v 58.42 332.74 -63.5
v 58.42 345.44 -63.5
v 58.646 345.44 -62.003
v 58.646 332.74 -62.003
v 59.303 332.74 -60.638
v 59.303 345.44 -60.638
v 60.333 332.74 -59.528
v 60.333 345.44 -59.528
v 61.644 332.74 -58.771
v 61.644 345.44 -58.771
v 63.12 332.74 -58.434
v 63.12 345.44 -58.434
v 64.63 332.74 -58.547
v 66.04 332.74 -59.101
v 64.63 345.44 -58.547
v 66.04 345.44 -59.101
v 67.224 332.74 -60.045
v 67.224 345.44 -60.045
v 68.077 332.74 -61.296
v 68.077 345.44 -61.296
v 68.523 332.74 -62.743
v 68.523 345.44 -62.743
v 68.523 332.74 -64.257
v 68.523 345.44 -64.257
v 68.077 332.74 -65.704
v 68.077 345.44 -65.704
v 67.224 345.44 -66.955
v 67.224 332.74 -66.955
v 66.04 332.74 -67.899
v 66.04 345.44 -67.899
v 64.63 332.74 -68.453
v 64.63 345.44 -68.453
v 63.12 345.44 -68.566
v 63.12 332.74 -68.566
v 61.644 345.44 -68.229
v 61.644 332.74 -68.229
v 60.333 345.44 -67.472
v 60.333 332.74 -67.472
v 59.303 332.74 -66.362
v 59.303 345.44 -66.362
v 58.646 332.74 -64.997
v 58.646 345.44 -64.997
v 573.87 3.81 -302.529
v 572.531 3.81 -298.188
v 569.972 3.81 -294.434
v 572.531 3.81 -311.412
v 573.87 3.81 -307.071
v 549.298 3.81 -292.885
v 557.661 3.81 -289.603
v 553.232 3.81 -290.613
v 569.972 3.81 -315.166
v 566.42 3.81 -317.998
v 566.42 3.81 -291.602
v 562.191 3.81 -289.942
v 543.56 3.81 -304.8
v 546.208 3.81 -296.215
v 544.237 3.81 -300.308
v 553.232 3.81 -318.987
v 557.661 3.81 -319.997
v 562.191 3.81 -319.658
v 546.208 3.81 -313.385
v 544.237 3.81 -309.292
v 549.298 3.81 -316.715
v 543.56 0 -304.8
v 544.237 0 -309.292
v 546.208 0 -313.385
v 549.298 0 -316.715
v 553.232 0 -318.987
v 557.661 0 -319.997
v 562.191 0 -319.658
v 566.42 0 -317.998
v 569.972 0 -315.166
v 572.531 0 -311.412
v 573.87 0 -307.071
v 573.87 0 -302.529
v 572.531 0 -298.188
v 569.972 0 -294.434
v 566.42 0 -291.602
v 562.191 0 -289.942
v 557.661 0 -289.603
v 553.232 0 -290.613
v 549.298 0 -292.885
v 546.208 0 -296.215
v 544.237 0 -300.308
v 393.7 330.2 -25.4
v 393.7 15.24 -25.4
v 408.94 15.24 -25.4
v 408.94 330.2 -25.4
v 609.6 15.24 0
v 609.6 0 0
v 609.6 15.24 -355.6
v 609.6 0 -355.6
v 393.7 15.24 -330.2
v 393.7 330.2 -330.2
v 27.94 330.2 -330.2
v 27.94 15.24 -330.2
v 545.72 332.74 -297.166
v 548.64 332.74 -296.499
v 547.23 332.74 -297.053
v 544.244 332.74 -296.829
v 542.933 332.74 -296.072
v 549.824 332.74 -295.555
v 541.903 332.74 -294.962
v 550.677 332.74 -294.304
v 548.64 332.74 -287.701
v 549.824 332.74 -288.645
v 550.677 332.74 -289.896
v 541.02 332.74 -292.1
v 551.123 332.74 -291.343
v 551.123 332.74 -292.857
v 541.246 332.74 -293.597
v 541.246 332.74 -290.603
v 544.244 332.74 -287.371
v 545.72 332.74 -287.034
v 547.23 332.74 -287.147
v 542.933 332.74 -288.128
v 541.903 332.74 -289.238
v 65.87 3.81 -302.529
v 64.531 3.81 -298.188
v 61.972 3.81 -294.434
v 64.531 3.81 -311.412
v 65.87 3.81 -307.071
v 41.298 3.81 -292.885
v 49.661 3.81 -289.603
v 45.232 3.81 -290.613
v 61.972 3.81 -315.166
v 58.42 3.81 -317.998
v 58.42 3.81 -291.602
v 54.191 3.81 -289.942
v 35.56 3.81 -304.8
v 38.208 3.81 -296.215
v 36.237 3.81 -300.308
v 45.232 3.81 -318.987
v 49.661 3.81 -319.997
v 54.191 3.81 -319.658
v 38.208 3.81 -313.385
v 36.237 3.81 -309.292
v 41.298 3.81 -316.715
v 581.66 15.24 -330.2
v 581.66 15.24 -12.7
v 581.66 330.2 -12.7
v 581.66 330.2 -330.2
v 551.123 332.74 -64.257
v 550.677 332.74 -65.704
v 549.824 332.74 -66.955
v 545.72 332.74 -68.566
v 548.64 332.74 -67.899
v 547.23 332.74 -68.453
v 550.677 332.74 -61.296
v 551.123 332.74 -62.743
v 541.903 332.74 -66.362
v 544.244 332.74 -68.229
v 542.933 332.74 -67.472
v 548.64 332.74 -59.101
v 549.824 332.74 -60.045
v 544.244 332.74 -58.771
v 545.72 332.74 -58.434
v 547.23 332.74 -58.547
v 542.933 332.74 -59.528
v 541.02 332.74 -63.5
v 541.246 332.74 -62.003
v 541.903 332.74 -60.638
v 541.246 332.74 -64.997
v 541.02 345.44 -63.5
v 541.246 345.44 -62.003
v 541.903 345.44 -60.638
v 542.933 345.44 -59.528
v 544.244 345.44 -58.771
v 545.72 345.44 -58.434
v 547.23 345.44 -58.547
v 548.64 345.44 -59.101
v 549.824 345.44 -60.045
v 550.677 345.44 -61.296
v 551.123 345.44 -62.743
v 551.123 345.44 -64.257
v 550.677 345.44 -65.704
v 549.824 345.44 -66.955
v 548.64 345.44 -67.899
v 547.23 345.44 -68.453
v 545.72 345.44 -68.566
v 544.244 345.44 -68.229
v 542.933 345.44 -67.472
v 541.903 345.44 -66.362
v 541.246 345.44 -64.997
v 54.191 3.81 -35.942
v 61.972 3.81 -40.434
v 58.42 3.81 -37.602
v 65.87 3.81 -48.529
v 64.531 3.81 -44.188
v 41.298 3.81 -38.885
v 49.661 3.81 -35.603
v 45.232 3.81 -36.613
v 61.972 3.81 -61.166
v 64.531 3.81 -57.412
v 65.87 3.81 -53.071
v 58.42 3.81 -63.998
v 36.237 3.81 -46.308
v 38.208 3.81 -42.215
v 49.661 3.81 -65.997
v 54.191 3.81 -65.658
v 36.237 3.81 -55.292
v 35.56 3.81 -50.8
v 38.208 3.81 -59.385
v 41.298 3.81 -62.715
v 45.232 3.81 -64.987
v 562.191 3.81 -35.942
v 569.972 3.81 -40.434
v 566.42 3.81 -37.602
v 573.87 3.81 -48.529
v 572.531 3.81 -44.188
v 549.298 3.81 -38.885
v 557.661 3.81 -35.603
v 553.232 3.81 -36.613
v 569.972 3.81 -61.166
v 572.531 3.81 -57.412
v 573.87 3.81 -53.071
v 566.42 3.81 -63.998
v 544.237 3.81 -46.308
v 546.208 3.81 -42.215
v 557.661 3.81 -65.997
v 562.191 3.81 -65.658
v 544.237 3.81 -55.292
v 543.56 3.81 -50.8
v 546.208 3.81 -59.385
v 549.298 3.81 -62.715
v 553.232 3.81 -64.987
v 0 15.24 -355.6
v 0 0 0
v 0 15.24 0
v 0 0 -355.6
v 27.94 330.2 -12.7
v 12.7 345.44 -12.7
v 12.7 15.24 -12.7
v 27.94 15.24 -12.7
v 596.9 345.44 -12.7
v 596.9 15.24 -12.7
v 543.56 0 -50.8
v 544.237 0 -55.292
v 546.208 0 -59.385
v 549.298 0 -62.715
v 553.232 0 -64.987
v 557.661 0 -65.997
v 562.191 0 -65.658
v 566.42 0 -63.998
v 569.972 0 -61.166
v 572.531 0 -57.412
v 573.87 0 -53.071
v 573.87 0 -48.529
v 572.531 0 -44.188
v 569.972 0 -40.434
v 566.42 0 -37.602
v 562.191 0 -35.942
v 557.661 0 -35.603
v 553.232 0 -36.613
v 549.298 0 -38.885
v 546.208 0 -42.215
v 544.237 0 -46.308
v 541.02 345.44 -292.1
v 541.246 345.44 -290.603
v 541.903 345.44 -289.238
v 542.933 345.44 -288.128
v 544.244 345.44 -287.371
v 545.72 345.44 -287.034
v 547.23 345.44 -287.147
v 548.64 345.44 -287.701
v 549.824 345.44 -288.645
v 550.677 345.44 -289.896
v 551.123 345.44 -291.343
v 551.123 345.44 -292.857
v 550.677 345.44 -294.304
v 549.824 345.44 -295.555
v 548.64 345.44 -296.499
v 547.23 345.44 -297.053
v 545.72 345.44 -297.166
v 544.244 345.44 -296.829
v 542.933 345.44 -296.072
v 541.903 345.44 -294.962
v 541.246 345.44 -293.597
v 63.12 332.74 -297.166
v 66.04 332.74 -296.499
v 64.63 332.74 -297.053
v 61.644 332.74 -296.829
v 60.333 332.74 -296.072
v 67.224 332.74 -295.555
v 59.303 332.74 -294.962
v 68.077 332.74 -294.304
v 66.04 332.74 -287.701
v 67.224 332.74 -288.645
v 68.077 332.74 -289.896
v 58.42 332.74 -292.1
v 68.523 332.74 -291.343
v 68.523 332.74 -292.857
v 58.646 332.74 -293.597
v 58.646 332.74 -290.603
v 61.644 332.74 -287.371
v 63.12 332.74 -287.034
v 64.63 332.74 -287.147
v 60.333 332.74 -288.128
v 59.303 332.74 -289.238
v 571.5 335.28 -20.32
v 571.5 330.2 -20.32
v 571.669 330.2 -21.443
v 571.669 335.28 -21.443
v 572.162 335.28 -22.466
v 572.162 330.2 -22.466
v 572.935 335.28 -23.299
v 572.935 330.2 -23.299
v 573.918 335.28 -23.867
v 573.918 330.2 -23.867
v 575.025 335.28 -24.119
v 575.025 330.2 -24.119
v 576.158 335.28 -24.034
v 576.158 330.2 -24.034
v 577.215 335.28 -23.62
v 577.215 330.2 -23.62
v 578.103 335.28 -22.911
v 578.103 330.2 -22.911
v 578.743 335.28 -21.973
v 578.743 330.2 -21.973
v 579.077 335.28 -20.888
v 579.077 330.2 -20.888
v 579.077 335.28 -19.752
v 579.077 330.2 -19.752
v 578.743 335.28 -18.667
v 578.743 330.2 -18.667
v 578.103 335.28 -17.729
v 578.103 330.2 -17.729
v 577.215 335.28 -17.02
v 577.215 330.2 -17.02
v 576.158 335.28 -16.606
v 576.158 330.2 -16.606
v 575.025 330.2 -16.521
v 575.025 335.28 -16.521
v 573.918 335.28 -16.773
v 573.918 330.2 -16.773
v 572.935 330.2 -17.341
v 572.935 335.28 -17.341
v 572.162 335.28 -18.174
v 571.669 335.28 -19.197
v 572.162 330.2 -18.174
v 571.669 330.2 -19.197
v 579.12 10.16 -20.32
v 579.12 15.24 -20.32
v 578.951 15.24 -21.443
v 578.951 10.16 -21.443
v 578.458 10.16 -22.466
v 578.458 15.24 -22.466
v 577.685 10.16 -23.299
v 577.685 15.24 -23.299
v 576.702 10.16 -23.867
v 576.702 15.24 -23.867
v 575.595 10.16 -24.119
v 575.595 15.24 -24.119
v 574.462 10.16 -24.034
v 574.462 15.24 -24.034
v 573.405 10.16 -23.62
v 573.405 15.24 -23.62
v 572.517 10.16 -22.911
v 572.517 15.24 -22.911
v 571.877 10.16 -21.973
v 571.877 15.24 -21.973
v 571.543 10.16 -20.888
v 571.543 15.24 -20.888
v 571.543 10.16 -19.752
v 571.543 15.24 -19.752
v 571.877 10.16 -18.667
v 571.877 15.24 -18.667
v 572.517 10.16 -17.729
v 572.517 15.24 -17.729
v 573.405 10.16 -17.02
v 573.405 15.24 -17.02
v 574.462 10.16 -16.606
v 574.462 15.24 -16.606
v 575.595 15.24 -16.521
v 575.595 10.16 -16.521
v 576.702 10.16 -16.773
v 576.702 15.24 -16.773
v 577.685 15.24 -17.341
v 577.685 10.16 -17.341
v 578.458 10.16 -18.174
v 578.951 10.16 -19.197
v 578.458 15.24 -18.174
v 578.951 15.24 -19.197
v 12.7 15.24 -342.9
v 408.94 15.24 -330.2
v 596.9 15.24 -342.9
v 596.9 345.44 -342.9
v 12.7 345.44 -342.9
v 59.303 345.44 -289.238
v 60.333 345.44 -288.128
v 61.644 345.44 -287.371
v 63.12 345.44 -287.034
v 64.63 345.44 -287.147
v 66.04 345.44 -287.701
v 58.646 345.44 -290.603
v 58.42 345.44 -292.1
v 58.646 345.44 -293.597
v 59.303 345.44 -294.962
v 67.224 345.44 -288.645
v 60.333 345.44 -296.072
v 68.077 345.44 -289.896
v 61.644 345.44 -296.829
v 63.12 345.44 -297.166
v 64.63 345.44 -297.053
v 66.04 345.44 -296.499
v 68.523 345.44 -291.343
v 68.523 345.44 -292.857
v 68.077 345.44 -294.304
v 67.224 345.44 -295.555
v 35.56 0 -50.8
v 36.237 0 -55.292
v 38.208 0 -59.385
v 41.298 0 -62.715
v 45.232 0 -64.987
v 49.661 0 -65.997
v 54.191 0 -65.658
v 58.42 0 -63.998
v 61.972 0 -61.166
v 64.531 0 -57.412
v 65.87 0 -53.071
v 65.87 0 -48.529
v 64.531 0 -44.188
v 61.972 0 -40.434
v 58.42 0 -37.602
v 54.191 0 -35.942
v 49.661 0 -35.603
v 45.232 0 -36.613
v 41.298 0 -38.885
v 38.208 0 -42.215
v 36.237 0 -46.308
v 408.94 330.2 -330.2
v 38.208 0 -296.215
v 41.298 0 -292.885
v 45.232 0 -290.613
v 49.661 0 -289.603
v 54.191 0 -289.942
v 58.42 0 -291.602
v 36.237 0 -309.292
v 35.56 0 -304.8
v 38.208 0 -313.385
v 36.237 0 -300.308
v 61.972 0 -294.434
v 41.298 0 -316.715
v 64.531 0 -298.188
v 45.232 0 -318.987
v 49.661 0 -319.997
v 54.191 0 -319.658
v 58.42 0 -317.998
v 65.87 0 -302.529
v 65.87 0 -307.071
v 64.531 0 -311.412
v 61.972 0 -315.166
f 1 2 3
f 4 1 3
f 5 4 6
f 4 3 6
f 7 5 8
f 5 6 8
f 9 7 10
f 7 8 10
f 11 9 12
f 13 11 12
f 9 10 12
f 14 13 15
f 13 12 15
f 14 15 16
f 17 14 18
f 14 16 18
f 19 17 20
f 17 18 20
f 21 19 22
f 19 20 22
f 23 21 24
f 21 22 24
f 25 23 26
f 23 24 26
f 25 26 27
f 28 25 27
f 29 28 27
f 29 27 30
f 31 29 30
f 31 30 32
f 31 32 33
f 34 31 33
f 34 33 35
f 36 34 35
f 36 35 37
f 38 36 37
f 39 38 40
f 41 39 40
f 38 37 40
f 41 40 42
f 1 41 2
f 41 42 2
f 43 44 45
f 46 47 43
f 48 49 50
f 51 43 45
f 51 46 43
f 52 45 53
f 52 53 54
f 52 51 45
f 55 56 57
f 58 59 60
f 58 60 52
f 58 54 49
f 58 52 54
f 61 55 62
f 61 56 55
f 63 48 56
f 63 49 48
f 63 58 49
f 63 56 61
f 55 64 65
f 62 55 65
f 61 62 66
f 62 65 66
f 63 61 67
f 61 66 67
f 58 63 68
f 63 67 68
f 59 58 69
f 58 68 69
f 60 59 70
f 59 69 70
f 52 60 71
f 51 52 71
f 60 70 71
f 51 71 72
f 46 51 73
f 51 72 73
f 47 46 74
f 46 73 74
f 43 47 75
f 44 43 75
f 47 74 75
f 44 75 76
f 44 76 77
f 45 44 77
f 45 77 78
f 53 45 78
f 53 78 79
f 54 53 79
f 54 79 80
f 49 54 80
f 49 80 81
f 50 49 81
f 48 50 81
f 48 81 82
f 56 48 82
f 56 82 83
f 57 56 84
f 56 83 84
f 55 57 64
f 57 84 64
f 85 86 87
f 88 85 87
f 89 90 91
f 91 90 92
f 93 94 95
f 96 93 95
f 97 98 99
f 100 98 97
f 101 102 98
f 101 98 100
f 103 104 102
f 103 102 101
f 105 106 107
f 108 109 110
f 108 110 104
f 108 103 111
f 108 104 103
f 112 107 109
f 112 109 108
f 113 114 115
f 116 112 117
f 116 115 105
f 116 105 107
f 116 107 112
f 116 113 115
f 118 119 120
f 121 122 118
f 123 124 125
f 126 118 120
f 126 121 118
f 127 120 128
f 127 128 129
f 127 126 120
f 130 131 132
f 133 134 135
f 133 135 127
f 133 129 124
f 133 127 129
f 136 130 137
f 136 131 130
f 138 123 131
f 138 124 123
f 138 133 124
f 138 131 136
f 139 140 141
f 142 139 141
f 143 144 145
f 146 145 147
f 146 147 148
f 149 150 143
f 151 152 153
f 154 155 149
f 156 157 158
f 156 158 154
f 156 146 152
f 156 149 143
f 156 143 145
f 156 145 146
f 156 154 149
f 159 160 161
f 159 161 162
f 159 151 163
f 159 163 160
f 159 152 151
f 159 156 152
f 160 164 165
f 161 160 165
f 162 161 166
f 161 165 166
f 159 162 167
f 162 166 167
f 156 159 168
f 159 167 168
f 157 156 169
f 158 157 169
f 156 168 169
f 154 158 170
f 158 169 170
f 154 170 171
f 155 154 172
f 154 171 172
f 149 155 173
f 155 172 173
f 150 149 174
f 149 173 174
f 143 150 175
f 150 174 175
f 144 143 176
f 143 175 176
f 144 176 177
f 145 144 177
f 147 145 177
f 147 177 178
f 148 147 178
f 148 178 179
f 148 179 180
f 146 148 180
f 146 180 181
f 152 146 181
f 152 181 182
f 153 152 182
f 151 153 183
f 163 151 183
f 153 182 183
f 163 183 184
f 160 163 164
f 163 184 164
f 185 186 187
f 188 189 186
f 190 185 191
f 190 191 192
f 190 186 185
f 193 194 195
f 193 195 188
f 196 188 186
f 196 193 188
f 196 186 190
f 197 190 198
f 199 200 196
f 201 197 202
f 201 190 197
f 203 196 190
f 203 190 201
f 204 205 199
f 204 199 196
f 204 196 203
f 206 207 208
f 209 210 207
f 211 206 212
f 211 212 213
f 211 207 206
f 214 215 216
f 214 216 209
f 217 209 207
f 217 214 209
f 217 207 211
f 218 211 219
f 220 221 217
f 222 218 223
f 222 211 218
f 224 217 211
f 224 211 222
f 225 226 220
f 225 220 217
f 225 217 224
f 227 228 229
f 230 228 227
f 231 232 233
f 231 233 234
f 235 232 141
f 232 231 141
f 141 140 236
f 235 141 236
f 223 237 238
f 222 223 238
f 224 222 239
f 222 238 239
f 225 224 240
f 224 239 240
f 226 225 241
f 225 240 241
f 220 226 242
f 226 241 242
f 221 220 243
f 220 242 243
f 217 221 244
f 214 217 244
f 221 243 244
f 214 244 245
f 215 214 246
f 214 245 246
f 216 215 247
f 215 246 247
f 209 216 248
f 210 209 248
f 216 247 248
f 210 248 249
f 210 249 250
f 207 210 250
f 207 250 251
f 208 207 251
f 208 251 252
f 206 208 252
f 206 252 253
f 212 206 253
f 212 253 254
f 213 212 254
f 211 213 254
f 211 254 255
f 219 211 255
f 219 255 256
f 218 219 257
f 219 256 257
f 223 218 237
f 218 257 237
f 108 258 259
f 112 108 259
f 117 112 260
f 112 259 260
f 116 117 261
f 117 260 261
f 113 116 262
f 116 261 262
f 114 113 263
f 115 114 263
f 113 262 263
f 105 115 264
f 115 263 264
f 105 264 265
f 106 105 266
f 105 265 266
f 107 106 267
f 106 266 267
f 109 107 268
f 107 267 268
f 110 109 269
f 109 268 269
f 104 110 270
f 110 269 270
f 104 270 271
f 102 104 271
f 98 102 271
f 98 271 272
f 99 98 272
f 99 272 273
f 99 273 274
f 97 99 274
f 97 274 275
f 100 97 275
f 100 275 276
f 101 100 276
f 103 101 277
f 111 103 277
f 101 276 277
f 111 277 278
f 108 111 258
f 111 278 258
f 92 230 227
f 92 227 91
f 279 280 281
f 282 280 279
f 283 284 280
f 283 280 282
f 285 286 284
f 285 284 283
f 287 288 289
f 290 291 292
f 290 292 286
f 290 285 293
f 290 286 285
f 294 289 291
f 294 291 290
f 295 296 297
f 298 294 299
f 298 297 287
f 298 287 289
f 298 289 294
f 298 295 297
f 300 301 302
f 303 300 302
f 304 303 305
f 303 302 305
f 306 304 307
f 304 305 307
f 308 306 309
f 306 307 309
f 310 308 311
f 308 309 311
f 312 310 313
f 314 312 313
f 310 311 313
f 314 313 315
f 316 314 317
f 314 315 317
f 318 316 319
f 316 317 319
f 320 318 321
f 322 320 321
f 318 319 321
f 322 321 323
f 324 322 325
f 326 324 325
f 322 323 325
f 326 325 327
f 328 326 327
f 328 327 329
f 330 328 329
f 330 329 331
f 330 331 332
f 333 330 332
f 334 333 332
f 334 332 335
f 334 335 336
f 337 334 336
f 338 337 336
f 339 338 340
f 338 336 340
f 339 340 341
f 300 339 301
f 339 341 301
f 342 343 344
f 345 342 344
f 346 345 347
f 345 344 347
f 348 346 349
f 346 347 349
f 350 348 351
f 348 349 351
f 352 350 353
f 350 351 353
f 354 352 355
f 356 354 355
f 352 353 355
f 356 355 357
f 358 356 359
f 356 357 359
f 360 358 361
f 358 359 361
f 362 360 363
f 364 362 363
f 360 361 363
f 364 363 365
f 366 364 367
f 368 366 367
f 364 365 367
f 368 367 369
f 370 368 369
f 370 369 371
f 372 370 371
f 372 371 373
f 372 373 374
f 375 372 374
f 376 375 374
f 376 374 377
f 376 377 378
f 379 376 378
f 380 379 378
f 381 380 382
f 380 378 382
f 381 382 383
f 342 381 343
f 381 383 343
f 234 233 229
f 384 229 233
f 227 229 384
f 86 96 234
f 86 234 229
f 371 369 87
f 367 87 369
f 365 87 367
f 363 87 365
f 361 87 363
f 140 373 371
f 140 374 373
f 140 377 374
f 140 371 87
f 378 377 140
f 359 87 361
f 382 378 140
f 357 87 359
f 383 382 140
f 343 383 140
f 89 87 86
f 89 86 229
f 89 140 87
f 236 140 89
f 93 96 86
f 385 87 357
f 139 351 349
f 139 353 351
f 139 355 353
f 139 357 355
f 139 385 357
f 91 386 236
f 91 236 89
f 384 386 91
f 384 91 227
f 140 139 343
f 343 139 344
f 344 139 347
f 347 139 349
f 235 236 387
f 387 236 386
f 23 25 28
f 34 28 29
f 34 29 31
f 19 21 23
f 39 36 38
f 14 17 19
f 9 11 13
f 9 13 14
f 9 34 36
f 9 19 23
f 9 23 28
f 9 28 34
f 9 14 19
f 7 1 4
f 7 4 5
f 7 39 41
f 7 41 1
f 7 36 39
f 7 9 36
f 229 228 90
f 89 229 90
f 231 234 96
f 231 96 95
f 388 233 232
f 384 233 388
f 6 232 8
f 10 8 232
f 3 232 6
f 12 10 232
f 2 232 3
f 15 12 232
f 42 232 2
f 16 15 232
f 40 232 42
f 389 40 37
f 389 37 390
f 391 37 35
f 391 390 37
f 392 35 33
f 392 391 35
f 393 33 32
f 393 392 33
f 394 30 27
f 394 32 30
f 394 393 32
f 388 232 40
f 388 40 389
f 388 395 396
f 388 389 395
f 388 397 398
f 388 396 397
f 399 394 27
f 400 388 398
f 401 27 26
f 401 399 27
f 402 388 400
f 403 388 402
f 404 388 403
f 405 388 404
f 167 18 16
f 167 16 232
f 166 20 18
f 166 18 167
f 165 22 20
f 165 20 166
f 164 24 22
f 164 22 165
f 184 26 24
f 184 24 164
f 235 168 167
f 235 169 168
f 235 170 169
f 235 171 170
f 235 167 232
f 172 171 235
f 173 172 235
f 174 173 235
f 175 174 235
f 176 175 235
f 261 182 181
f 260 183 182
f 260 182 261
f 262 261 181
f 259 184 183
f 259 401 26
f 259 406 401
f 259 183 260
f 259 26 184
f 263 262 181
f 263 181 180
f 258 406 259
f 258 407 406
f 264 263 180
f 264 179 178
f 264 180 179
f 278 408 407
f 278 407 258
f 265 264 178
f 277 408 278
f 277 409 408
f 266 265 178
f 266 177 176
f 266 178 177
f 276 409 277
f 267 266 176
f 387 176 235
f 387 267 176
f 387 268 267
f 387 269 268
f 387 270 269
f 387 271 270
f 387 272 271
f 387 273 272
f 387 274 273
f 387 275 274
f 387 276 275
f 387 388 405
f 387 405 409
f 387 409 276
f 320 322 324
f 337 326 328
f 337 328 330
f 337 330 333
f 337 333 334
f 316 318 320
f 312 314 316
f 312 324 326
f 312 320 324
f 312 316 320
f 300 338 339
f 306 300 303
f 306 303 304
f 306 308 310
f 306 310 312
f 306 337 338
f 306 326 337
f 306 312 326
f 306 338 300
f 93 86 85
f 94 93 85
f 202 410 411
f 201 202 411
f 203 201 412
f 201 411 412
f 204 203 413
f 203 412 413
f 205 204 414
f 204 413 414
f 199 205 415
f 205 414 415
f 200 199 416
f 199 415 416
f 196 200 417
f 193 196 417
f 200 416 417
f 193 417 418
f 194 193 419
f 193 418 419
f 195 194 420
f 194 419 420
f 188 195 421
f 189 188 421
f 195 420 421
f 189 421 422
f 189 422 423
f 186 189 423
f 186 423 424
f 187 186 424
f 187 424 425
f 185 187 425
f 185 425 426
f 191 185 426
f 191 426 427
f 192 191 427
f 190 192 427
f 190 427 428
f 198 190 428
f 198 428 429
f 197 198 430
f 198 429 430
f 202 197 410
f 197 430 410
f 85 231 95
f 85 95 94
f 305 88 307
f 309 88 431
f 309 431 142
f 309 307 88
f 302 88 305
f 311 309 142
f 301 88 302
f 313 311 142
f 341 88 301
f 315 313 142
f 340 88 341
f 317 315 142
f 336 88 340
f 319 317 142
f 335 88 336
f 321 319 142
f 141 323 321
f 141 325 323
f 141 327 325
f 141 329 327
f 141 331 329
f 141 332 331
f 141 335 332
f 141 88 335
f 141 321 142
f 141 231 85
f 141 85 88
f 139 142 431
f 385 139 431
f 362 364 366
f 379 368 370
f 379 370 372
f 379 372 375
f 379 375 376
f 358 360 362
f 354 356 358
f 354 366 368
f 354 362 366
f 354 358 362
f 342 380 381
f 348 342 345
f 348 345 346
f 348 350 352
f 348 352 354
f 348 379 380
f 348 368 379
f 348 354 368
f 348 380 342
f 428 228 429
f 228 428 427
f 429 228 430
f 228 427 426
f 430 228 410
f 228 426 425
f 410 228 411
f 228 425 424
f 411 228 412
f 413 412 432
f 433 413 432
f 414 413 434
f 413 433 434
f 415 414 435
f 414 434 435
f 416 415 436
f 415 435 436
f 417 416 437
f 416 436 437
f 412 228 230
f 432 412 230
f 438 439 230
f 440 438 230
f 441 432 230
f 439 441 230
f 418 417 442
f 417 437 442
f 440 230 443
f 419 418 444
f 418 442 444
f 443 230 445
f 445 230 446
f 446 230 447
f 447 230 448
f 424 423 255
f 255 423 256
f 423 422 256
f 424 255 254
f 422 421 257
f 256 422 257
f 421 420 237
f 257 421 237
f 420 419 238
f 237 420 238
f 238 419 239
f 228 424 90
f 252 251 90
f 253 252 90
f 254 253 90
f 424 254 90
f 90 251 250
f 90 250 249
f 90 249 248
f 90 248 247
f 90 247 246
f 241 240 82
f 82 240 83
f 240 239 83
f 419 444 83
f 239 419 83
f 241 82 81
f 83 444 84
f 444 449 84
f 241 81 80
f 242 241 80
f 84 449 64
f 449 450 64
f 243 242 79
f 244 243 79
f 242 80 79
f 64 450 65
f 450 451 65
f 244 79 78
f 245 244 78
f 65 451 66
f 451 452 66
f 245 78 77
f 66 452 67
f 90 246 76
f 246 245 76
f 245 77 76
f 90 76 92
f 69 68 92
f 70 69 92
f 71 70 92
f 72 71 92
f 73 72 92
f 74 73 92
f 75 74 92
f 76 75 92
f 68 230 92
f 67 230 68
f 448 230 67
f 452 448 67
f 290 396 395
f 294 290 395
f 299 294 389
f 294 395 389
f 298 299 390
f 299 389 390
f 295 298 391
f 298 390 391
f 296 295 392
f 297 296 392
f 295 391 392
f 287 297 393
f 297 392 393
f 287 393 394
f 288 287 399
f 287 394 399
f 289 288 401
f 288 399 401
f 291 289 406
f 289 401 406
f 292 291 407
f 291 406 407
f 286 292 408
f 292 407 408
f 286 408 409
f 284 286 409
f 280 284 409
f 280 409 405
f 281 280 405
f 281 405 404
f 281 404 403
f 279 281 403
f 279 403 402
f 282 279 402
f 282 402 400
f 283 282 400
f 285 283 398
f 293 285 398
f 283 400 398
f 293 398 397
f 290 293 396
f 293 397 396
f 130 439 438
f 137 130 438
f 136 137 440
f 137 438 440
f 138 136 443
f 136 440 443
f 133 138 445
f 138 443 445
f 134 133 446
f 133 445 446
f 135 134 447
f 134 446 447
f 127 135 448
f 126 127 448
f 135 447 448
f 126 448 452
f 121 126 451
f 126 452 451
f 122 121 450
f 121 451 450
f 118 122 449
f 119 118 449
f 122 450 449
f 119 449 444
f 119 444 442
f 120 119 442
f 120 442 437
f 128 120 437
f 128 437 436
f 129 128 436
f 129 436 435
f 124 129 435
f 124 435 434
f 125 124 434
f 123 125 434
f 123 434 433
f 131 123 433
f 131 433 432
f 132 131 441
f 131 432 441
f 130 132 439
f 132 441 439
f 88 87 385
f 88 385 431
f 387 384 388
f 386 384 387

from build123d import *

# Parameters (mm, degrees)
SKETCH1_W           = 609.6
SKETCH1_H           = 355.6
BOSS_EXTRUDE1_DEPTH = 15.24
SKETCH2_R           = 15.24
CUT_EXTRUDE1_DEPTH  = 3.81
SKETCH3_W           = 584.2
SKETCH3_H           = 330.2
BOSS_EXTRUDE2_DEPTH = 330.2
SKETCH4_W           = 172.72
SKETCH4_H           = 314.96
SKETCH4_W_2         = 365.76
CUT_EXTRUDE2_DEPTH  = 330.2
SKETCH6_W           = 15.24
SKETCH6_H           = 314.96
CUT_EXTRUDE4_DEPTH  = 12.7
SKETCH8_W           = 584.2
SKETCH8_H           = 330.2
BOSS_EXTRUDE4_DEPTH = 12.7
SKETCH11_R          = 3.81
CUT_EXTRUDE5_DEPTH  = 5.08
SKETCH12_R          = 3.81
CUT_EXTRUDE6_DEPTH  = 5.08
SKETCH13_R          = 5.08
CUT_EXTRUDE7_DEPTH  = 12.7


with BuildPart() as part:
    # Sketch1 → Boss-Extrude1 (new body)
    with BuildSketch(Plane(origin=(0, 0, 0), x_dir=(1, 0, 0), z_dir=(0, 1, 0))):
        with Locations((304.8, 177.8)):
            Rectangle(SKETCH1_W, SKETCH1_H)
    extrude(amount=BOSS_EXTRUDE1_DEPTH)

    # Sketch2 → Cut-Extrude1 (cut)
    with BuildSketch(Plane(origin=(0, 0, 0), x_dir=(-1, 0, 0), z_dir=(0, -1, 0))):
        with Locations((-558.8, 50.8)):
            Circle(SKETCH2_R)
        with Locations((-558.8, 304.8)):
            Circle(SKETCH2_R)
        with Locations((-50.8, 50.8)):
            Circle(SKETCH2_R)
        with Locations((-50.8, 304.8)):
            Circle(SKETCH2_R)
    extrude(amount=-CUT_EXTRUDE1_DEPTH, mode=Mode.SUBTRACT)

    # Sketch3 → Boss-Extrude2 (add)
    with BuildSketch(Plane(origin=(0, 15.24, 0), x_dir=(1, 0, 0), z_dir=(0, 1, 0))):
        with Locations((304.8, 177.8)):
            Rectangle(SKETCH3_W, SKETCH3_H)
    extrude(amount=BOSS_EXTRUDE2_DEPTH)

    # Sketch4 → Cut-Extrude2 (cut)
    with BuildSketch(Plane.XY.offset(-12.7)):
        with Locations((495.3, 172.72)):
            Rectangle(SKETCH4_W, SKETCH4_H)
        with Locations((210.82, 172.72)):
            Rectangle(SKETCH4_W_2, SKETCH4_H)
    extrude(amount=-CUT_EXTRUDE2_DEPTH, mode=Mode.SUBTRACT)

    # Sketch6 → Cut-Extrude4 (cut)
    with BuildSketch(Plane.XY.offset(-12.7)):
        with Locations((401.32, 172.72)):
            Rectangle(SKETCH6_W, SKETCH6_H)
    extrude(amount=-CUT_EXTRUDE4_DEPTH, mode=Mode.SUBTRACT)

    # Sketch8 → Boss-Extrude4 (add)
    with BuildSketch(Plane(origin=(0, 0, -342.9), x_dir=(-1, 0, 0), z_dir=(0, 0, -1))):
        with Locations((-304.8, 180.34)):
            Rectangle(SKETCH8_W, SKETCH8_H)
    extrude(amount=-BOSS_EXTRUDE4_DEPTH)

    # Sketch11 → Cut-Extrude5 (cut)
    with BuildSketch(Plane(origin=(0, 15.24, 0), x_dir=(1, 0, 0), z_dir=(0, 1, 0))):
        with Locations((575.31, 20.32)):
            Circle(SKETCH11_R)
    extrude(amount=-CUT_EXTRUDE5_DEPTH, mode=Mode.SUBTRACT)

    # Sketch12 → Cut-Extrude6 (cut)
    with BuildSketch(Plane(origin=(0, 330.2, 0), x_dir=(-1, 0, 0), z_dir=(0, -1, 0))):
        with Locations((-575.31, 20.32)):
            Circle(SKETCH12_R)
    extrude(amount=-CUT_EXTRUDE6_DEPTH, mode=Mode.SUBTRACT)

    # Sketch13 → Cut-Extrude7 (cut)
    with BuildSketch(Plane(origin=(0, 345.44, 0), x_dir=(-1, 0, 0), z_dir=(0, 1, 0))):
        with Locations((-546.1, -63.5)):
            Circle(SKETCH13_R)
        with Locations((-63.5, -63.5)):
            Circle(SKETCH13_R)
        with Locations((-63.5, -292.1)):
            Circle(SKETCH13_R)
        with Locations((-546.1, -292.1)):
            Circle(SKETCH13_R)
    extrude(amount=-CUT_EXTRUDE7_DEPTH, mode=Mode.SUBTRACT)


solid = part.part
